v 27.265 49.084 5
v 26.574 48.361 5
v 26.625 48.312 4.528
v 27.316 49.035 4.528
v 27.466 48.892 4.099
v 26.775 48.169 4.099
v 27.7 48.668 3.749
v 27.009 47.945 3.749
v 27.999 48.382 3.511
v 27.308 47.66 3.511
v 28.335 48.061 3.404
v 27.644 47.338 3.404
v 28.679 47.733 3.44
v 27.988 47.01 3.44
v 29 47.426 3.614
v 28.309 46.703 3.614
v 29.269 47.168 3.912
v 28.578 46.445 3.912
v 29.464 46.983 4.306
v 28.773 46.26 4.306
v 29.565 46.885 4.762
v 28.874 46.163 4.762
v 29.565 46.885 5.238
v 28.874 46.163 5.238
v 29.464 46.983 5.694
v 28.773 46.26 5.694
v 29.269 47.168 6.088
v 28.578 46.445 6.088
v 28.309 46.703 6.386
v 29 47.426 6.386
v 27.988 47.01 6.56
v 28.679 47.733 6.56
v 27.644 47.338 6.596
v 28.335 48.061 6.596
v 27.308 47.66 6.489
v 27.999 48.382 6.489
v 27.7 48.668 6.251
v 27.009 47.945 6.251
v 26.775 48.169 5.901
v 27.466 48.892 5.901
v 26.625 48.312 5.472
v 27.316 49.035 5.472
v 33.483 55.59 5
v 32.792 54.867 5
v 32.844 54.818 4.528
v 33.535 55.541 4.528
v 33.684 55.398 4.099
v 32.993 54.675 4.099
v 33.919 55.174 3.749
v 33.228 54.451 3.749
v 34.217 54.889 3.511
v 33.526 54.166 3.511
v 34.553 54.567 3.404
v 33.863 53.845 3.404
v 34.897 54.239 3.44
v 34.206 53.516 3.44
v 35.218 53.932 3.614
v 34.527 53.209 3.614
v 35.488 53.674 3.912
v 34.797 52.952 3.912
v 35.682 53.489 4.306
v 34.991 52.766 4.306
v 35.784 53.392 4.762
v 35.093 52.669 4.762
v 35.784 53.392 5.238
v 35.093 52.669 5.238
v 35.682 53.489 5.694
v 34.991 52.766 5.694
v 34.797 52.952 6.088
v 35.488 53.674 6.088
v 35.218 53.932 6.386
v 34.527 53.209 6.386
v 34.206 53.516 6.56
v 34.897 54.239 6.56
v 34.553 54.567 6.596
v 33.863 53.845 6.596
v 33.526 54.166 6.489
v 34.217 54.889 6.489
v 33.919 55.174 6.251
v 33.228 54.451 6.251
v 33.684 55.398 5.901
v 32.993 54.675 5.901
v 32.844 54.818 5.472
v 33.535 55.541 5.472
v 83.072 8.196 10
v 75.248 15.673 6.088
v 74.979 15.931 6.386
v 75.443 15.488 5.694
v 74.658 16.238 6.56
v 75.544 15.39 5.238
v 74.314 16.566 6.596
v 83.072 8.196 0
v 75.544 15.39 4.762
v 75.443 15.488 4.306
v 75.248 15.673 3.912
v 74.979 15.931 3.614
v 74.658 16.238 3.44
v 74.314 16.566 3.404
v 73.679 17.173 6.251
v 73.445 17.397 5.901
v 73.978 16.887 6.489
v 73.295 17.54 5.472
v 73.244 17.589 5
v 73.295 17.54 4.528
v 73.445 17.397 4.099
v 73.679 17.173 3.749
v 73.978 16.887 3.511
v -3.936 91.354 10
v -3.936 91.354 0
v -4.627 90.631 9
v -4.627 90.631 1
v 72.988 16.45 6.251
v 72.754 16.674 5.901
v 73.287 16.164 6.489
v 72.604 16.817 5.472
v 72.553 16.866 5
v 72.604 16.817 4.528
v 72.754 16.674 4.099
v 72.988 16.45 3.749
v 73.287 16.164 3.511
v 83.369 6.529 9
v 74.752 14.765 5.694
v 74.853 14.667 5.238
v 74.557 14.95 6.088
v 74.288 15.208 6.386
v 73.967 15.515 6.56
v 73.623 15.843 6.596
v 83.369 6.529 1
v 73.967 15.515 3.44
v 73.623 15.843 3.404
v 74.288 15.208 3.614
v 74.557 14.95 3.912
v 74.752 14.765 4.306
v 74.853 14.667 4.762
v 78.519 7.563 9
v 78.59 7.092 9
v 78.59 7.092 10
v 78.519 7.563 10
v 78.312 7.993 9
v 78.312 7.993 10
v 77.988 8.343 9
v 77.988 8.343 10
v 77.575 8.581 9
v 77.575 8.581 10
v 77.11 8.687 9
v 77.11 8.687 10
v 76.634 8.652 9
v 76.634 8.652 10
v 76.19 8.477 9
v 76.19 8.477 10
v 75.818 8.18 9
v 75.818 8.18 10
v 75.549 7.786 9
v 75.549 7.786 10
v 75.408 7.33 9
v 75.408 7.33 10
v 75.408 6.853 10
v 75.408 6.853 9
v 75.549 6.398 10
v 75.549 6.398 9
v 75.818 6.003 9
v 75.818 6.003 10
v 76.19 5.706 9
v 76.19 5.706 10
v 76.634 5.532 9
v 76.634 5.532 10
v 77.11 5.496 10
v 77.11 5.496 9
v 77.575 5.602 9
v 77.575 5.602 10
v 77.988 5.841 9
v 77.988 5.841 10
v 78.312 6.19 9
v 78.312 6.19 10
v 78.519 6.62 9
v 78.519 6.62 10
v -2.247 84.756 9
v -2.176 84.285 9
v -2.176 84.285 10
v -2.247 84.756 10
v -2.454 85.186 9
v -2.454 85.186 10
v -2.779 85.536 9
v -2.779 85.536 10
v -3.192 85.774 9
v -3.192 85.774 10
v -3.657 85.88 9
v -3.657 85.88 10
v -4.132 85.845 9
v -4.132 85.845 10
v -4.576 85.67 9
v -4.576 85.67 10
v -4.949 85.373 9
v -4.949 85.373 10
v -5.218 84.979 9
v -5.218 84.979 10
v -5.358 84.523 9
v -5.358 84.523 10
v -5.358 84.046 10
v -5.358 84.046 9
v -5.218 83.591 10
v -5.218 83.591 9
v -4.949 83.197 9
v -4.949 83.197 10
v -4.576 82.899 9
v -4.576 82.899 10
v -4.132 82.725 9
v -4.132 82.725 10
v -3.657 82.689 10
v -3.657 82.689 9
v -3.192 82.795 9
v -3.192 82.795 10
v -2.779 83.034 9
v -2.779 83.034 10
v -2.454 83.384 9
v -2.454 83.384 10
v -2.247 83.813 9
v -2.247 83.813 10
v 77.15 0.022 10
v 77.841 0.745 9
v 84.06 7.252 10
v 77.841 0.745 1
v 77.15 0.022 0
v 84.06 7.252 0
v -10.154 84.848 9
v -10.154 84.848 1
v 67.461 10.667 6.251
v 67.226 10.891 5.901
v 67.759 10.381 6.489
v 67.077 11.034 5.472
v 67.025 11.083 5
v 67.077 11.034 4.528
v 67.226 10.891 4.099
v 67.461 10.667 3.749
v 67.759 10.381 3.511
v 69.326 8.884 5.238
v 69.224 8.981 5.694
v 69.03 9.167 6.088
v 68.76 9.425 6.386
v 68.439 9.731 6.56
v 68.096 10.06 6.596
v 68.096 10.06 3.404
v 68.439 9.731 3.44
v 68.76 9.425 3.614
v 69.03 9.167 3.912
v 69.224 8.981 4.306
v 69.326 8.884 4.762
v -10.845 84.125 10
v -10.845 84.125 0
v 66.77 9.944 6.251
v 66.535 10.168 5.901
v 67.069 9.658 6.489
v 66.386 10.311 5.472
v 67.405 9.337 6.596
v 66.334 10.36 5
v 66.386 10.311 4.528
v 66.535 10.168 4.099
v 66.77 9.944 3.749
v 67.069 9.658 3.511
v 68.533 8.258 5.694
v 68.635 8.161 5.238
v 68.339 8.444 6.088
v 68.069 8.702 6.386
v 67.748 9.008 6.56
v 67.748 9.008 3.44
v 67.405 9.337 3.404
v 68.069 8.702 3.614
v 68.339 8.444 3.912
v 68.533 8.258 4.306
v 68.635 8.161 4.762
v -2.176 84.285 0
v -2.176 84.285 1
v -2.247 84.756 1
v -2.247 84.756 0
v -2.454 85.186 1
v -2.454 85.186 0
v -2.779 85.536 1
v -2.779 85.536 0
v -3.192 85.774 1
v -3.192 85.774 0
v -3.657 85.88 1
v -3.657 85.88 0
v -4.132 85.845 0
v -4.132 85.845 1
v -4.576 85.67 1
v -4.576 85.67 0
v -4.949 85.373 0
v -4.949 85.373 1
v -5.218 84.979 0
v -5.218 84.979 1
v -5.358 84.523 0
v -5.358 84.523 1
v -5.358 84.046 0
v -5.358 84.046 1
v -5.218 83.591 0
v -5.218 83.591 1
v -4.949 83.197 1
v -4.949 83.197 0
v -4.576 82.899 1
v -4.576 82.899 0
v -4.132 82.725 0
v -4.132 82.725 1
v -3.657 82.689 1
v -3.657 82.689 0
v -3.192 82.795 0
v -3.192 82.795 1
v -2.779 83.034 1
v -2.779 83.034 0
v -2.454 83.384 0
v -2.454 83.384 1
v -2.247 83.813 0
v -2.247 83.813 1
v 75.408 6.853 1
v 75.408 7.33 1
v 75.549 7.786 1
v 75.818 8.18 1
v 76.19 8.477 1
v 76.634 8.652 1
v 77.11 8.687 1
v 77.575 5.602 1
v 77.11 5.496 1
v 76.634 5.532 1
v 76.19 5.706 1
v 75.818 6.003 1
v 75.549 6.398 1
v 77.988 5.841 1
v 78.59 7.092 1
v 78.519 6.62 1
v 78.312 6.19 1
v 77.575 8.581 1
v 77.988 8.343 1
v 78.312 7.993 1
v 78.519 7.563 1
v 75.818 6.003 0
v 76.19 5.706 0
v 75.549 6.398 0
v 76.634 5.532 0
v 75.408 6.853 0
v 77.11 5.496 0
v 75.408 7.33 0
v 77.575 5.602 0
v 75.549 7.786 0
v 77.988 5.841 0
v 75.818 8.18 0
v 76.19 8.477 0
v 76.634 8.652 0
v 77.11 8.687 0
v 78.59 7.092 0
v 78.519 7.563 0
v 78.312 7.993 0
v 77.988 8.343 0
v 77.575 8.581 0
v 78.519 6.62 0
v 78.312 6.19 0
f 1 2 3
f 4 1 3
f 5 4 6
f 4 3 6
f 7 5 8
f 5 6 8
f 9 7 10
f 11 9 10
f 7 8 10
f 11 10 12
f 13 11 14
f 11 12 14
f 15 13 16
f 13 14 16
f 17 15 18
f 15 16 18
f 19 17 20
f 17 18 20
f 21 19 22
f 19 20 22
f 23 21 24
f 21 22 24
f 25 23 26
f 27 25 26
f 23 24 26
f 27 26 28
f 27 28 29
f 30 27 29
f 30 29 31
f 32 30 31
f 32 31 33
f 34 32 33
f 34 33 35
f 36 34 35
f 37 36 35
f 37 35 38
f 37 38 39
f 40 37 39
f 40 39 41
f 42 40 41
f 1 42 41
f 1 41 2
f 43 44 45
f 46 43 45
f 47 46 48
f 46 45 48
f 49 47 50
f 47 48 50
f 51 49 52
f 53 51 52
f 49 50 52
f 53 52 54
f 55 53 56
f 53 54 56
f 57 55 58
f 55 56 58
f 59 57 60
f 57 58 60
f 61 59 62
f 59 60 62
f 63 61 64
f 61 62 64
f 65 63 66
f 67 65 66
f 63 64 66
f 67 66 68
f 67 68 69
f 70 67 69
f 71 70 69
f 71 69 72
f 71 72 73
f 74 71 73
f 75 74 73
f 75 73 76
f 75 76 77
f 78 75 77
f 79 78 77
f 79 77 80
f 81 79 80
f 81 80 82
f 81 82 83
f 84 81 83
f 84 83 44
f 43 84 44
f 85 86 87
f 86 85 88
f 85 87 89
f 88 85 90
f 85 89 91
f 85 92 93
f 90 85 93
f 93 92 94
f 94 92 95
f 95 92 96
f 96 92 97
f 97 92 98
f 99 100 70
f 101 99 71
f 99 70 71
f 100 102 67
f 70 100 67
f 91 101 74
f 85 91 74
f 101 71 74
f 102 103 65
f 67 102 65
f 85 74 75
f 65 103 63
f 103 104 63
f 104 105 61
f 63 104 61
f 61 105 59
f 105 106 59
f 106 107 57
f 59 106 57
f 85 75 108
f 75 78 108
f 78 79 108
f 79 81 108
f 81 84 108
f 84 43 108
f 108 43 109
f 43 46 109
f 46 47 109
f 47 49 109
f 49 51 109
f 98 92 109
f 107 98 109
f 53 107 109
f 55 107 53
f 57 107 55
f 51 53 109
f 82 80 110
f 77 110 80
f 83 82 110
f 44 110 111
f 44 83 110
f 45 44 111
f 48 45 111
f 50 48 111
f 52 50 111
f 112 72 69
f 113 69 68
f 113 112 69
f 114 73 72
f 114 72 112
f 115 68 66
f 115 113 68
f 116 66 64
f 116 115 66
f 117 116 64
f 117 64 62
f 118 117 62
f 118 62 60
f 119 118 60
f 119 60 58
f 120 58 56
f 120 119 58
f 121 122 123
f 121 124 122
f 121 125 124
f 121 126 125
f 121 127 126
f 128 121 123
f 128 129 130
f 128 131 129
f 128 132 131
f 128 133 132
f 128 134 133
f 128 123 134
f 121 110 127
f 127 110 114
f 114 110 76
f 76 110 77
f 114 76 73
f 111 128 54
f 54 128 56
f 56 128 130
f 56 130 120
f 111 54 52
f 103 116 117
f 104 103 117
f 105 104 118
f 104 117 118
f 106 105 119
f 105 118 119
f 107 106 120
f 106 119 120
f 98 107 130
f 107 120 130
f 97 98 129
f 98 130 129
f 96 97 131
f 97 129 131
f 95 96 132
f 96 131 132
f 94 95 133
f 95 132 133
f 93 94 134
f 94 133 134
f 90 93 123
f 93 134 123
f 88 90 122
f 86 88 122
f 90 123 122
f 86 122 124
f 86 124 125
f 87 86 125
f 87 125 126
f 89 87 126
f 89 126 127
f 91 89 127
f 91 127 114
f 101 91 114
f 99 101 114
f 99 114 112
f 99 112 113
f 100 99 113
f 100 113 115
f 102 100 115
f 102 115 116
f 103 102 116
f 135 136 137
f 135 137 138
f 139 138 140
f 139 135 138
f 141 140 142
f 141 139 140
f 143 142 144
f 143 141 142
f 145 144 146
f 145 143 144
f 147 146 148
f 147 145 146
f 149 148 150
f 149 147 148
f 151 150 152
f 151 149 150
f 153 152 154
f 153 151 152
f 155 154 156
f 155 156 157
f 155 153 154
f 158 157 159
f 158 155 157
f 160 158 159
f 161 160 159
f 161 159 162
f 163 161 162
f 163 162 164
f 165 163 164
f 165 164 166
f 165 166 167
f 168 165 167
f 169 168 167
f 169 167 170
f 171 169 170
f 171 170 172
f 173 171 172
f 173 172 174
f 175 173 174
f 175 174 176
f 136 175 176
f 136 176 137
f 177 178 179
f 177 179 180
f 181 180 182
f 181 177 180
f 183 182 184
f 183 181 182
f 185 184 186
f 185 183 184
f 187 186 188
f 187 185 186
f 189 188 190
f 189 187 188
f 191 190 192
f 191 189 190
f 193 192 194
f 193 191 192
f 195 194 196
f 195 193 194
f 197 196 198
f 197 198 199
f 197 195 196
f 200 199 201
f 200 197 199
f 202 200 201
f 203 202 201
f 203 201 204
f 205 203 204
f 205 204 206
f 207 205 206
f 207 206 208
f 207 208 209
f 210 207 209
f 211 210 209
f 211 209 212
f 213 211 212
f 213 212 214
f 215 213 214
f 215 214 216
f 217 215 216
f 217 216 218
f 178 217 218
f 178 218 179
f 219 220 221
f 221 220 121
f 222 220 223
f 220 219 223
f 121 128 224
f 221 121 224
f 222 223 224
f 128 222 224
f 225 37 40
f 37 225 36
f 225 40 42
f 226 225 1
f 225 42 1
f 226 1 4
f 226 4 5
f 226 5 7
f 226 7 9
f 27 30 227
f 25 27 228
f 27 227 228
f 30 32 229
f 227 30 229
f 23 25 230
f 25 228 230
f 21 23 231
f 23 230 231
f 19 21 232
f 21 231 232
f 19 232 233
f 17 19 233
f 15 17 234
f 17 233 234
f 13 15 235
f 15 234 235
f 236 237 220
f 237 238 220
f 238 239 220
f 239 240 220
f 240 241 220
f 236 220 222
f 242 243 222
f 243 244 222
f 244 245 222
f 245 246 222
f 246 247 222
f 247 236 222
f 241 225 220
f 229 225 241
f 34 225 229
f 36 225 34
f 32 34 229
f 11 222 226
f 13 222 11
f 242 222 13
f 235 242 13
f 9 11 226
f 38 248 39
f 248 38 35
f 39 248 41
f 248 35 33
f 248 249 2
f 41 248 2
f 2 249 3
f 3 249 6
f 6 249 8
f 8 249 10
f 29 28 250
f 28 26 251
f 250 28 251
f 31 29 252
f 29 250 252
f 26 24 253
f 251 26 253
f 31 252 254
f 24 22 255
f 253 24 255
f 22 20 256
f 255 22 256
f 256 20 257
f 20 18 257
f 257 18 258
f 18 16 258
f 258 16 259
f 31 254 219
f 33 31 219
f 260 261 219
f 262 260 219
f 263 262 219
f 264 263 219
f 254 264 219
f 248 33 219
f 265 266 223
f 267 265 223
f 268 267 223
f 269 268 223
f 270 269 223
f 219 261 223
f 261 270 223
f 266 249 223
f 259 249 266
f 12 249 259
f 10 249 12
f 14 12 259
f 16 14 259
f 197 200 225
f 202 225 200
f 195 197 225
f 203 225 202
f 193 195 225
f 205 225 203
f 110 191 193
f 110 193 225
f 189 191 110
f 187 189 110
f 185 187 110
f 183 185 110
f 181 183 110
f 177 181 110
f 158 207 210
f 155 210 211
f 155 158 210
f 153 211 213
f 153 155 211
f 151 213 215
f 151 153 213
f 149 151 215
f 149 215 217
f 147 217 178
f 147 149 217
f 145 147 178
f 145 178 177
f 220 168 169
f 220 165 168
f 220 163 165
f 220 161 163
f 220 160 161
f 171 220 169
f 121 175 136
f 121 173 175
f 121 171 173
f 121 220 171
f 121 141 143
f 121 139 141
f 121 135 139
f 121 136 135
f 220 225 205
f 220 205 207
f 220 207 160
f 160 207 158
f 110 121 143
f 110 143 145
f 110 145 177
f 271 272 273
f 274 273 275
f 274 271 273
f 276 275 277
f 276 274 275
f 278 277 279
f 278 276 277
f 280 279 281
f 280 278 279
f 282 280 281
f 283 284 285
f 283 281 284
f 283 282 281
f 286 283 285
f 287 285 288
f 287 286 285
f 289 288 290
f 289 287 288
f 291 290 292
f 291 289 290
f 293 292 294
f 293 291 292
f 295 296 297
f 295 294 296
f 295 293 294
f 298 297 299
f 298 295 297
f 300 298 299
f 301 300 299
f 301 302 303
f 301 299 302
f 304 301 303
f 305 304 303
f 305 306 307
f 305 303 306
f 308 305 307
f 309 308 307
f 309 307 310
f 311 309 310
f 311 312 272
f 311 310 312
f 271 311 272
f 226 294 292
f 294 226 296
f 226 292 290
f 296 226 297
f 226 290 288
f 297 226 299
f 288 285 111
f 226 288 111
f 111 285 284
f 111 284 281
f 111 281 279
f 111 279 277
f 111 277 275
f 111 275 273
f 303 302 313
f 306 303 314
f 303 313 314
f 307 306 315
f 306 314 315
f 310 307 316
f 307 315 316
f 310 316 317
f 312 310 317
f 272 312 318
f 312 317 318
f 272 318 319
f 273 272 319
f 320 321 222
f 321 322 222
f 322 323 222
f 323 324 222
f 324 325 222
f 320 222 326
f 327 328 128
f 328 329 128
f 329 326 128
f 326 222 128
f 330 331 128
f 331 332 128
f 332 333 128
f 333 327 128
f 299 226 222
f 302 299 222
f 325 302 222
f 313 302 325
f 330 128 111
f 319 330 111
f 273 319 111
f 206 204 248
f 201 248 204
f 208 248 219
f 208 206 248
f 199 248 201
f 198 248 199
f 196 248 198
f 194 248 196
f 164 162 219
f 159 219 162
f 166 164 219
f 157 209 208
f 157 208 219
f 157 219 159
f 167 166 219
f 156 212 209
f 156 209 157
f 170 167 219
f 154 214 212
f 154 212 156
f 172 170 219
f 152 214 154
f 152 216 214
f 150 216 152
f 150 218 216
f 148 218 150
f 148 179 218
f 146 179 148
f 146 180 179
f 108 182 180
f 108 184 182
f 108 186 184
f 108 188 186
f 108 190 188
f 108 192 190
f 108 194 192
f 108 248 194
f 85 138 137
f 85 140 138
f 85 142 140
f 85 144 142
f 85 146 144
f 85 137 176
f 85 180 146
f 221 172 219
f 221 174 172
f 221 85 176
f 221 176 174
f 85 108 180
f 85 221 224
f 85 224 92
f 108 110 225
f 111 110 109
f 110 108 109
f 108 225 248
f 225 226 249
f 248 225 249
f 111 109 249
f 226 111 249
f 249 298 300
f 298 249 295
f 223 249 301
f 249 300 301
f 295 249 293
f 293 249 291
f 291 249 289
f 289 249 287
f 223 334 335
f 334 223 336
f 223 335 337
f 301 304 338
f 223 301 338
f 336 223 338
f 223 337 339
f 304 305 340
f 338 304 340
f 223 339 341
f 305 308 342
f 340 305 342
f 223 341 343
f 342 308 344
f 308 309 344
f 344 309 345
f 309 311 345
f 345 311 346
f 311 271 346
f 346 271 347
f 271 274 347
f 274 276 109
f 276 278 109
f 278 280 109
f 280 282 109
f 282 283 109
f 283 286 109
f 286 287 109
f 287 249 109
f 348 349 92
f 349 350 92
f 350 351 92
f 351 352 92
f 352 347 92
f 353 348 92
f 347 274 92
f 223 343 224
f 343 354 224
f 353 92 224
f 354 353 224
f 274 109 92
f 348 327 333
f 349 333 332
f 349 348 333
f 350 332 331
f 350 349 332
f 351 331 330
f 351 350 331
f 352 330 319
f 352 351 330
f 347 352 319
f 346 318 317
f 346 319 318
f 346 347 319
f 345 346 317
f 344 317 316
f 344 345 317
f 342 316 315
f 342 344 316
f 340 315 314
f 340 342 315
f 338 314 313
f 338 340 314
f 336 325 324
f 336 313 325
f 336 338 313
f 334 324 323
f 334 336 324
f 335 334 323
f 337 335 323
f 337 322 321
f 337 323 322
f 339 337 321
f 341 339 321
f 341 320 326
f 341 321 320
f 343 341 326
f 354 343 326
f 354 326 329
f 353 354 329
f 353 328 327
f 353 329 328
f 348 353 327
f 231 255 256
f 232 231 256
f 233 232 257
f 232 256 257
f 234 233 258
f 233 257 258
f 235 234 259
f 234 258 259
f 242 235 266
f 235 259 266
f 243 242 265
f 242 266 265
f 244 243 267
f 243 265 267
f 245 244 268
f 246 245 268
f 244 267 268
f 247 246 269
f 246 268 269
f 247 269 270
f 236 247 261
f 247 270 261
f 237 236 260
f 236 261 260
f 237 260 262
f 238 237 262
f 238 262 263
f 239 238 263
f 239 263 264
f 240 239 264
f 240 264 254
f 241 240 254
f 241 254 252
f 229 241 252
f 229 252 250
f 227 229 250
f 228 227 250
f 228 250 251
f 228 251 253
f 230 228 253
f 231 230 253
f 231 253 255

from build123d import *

# Parameters (mm, degrees)
SKETCH_2_R          = 1.6
EXTRUDE_1_DEPTH     = 10
SKETCH_3_W          = 8
SKETCH_3_H          = 8
CUT_EXTRUDE_1_DEPTH = 140.947387002
CUT_EXTRUDE_3_DEPTH = 10


with BuildPart() as part:
    # ｽｹｯﾁ2 → ﾎﾞｽ - 押し出し1 (new body)
    with BuildSketch(Plane.XY):
        Polygon((83.071643169, 8.195972832), (-3.936021884, 91.354077293), (-10.845357286, 84.124894469), (77.150331852, 0.022479987), (84.059667254, 7.25166281), align=None)
        with Locations((-3.776098173, 84.28481818)):
            Circle(SKETCH_2_R, mode=Mode.SUBTRACT)
        with Locations((76.990408141, 7.0917391)):
            Circle(SKETCH_2_R, mode=Mode.SUBTRACT)
    extrude(amount=EXTRUDE_1_DEPTH)

    # ｽｹｯﾁ3 → ｶｯﾄ - 押し出し1 (cut, through all)
    with BuildSketch(Plane(origin=(40.308371471, -38.524970914, 0), x_dir=(0, 0, -1), z_dir=(0.7229182823698357, -0.690933540230496, 0))):
        with Locations((-5, 58.32200311)):
            Rectangle(SKETCH_3_W, SKETCH_3_H)
    extrude(amount=-CUT_EXTRUDE_1_DEPTH, mode=Mode.SUBTRACT)

    # ｽｹｯﾁ5 → ｶｯﾄ - 押し出し3 (cut)
    with BuildSketch(Plane(origin=(36.841960381, 38.5474509, 0), x_dir=(0.7229182823698362, -0.6909335402304956, 0), z_dir=(-0.6909335402304956, -0.7229182823698362, 0))):
        with BuildLine():
            ThreePointArc((-11.003582504, 5), (-12.603582504, 6.6), (-14.203582504, 5))
            Line((-14.203582504, 5), (-11.003582504, 5))
        make_face()
        with BuildLine():
            Line((-11.003582504, 5), (-14.203582504, 5))
            ThreePointArc((-14.203582504, 5), (-12.603582504, 3.4), (-11.003582504, 5))
        make_face()
        with BuildLine():
            ThreePointArc((43.996417496, 5), (42.396417496, 6.6), (40.796417496, 5))
            Line((40.796417496, 5), (43.996417496, 5))
        make_face()
        with BuildLine():
            Line((43.996417496, 5), (40.796417496, 5))
            ThreePointArc((40.796417496, 5), (42.396417496, 3.4), (43.996417496, 5))
        make_face()
    extrude(amount=-CUT_EXTRUDE_3_DEPTH, mode=Mode.SUBTRACT)


solid = part.part
